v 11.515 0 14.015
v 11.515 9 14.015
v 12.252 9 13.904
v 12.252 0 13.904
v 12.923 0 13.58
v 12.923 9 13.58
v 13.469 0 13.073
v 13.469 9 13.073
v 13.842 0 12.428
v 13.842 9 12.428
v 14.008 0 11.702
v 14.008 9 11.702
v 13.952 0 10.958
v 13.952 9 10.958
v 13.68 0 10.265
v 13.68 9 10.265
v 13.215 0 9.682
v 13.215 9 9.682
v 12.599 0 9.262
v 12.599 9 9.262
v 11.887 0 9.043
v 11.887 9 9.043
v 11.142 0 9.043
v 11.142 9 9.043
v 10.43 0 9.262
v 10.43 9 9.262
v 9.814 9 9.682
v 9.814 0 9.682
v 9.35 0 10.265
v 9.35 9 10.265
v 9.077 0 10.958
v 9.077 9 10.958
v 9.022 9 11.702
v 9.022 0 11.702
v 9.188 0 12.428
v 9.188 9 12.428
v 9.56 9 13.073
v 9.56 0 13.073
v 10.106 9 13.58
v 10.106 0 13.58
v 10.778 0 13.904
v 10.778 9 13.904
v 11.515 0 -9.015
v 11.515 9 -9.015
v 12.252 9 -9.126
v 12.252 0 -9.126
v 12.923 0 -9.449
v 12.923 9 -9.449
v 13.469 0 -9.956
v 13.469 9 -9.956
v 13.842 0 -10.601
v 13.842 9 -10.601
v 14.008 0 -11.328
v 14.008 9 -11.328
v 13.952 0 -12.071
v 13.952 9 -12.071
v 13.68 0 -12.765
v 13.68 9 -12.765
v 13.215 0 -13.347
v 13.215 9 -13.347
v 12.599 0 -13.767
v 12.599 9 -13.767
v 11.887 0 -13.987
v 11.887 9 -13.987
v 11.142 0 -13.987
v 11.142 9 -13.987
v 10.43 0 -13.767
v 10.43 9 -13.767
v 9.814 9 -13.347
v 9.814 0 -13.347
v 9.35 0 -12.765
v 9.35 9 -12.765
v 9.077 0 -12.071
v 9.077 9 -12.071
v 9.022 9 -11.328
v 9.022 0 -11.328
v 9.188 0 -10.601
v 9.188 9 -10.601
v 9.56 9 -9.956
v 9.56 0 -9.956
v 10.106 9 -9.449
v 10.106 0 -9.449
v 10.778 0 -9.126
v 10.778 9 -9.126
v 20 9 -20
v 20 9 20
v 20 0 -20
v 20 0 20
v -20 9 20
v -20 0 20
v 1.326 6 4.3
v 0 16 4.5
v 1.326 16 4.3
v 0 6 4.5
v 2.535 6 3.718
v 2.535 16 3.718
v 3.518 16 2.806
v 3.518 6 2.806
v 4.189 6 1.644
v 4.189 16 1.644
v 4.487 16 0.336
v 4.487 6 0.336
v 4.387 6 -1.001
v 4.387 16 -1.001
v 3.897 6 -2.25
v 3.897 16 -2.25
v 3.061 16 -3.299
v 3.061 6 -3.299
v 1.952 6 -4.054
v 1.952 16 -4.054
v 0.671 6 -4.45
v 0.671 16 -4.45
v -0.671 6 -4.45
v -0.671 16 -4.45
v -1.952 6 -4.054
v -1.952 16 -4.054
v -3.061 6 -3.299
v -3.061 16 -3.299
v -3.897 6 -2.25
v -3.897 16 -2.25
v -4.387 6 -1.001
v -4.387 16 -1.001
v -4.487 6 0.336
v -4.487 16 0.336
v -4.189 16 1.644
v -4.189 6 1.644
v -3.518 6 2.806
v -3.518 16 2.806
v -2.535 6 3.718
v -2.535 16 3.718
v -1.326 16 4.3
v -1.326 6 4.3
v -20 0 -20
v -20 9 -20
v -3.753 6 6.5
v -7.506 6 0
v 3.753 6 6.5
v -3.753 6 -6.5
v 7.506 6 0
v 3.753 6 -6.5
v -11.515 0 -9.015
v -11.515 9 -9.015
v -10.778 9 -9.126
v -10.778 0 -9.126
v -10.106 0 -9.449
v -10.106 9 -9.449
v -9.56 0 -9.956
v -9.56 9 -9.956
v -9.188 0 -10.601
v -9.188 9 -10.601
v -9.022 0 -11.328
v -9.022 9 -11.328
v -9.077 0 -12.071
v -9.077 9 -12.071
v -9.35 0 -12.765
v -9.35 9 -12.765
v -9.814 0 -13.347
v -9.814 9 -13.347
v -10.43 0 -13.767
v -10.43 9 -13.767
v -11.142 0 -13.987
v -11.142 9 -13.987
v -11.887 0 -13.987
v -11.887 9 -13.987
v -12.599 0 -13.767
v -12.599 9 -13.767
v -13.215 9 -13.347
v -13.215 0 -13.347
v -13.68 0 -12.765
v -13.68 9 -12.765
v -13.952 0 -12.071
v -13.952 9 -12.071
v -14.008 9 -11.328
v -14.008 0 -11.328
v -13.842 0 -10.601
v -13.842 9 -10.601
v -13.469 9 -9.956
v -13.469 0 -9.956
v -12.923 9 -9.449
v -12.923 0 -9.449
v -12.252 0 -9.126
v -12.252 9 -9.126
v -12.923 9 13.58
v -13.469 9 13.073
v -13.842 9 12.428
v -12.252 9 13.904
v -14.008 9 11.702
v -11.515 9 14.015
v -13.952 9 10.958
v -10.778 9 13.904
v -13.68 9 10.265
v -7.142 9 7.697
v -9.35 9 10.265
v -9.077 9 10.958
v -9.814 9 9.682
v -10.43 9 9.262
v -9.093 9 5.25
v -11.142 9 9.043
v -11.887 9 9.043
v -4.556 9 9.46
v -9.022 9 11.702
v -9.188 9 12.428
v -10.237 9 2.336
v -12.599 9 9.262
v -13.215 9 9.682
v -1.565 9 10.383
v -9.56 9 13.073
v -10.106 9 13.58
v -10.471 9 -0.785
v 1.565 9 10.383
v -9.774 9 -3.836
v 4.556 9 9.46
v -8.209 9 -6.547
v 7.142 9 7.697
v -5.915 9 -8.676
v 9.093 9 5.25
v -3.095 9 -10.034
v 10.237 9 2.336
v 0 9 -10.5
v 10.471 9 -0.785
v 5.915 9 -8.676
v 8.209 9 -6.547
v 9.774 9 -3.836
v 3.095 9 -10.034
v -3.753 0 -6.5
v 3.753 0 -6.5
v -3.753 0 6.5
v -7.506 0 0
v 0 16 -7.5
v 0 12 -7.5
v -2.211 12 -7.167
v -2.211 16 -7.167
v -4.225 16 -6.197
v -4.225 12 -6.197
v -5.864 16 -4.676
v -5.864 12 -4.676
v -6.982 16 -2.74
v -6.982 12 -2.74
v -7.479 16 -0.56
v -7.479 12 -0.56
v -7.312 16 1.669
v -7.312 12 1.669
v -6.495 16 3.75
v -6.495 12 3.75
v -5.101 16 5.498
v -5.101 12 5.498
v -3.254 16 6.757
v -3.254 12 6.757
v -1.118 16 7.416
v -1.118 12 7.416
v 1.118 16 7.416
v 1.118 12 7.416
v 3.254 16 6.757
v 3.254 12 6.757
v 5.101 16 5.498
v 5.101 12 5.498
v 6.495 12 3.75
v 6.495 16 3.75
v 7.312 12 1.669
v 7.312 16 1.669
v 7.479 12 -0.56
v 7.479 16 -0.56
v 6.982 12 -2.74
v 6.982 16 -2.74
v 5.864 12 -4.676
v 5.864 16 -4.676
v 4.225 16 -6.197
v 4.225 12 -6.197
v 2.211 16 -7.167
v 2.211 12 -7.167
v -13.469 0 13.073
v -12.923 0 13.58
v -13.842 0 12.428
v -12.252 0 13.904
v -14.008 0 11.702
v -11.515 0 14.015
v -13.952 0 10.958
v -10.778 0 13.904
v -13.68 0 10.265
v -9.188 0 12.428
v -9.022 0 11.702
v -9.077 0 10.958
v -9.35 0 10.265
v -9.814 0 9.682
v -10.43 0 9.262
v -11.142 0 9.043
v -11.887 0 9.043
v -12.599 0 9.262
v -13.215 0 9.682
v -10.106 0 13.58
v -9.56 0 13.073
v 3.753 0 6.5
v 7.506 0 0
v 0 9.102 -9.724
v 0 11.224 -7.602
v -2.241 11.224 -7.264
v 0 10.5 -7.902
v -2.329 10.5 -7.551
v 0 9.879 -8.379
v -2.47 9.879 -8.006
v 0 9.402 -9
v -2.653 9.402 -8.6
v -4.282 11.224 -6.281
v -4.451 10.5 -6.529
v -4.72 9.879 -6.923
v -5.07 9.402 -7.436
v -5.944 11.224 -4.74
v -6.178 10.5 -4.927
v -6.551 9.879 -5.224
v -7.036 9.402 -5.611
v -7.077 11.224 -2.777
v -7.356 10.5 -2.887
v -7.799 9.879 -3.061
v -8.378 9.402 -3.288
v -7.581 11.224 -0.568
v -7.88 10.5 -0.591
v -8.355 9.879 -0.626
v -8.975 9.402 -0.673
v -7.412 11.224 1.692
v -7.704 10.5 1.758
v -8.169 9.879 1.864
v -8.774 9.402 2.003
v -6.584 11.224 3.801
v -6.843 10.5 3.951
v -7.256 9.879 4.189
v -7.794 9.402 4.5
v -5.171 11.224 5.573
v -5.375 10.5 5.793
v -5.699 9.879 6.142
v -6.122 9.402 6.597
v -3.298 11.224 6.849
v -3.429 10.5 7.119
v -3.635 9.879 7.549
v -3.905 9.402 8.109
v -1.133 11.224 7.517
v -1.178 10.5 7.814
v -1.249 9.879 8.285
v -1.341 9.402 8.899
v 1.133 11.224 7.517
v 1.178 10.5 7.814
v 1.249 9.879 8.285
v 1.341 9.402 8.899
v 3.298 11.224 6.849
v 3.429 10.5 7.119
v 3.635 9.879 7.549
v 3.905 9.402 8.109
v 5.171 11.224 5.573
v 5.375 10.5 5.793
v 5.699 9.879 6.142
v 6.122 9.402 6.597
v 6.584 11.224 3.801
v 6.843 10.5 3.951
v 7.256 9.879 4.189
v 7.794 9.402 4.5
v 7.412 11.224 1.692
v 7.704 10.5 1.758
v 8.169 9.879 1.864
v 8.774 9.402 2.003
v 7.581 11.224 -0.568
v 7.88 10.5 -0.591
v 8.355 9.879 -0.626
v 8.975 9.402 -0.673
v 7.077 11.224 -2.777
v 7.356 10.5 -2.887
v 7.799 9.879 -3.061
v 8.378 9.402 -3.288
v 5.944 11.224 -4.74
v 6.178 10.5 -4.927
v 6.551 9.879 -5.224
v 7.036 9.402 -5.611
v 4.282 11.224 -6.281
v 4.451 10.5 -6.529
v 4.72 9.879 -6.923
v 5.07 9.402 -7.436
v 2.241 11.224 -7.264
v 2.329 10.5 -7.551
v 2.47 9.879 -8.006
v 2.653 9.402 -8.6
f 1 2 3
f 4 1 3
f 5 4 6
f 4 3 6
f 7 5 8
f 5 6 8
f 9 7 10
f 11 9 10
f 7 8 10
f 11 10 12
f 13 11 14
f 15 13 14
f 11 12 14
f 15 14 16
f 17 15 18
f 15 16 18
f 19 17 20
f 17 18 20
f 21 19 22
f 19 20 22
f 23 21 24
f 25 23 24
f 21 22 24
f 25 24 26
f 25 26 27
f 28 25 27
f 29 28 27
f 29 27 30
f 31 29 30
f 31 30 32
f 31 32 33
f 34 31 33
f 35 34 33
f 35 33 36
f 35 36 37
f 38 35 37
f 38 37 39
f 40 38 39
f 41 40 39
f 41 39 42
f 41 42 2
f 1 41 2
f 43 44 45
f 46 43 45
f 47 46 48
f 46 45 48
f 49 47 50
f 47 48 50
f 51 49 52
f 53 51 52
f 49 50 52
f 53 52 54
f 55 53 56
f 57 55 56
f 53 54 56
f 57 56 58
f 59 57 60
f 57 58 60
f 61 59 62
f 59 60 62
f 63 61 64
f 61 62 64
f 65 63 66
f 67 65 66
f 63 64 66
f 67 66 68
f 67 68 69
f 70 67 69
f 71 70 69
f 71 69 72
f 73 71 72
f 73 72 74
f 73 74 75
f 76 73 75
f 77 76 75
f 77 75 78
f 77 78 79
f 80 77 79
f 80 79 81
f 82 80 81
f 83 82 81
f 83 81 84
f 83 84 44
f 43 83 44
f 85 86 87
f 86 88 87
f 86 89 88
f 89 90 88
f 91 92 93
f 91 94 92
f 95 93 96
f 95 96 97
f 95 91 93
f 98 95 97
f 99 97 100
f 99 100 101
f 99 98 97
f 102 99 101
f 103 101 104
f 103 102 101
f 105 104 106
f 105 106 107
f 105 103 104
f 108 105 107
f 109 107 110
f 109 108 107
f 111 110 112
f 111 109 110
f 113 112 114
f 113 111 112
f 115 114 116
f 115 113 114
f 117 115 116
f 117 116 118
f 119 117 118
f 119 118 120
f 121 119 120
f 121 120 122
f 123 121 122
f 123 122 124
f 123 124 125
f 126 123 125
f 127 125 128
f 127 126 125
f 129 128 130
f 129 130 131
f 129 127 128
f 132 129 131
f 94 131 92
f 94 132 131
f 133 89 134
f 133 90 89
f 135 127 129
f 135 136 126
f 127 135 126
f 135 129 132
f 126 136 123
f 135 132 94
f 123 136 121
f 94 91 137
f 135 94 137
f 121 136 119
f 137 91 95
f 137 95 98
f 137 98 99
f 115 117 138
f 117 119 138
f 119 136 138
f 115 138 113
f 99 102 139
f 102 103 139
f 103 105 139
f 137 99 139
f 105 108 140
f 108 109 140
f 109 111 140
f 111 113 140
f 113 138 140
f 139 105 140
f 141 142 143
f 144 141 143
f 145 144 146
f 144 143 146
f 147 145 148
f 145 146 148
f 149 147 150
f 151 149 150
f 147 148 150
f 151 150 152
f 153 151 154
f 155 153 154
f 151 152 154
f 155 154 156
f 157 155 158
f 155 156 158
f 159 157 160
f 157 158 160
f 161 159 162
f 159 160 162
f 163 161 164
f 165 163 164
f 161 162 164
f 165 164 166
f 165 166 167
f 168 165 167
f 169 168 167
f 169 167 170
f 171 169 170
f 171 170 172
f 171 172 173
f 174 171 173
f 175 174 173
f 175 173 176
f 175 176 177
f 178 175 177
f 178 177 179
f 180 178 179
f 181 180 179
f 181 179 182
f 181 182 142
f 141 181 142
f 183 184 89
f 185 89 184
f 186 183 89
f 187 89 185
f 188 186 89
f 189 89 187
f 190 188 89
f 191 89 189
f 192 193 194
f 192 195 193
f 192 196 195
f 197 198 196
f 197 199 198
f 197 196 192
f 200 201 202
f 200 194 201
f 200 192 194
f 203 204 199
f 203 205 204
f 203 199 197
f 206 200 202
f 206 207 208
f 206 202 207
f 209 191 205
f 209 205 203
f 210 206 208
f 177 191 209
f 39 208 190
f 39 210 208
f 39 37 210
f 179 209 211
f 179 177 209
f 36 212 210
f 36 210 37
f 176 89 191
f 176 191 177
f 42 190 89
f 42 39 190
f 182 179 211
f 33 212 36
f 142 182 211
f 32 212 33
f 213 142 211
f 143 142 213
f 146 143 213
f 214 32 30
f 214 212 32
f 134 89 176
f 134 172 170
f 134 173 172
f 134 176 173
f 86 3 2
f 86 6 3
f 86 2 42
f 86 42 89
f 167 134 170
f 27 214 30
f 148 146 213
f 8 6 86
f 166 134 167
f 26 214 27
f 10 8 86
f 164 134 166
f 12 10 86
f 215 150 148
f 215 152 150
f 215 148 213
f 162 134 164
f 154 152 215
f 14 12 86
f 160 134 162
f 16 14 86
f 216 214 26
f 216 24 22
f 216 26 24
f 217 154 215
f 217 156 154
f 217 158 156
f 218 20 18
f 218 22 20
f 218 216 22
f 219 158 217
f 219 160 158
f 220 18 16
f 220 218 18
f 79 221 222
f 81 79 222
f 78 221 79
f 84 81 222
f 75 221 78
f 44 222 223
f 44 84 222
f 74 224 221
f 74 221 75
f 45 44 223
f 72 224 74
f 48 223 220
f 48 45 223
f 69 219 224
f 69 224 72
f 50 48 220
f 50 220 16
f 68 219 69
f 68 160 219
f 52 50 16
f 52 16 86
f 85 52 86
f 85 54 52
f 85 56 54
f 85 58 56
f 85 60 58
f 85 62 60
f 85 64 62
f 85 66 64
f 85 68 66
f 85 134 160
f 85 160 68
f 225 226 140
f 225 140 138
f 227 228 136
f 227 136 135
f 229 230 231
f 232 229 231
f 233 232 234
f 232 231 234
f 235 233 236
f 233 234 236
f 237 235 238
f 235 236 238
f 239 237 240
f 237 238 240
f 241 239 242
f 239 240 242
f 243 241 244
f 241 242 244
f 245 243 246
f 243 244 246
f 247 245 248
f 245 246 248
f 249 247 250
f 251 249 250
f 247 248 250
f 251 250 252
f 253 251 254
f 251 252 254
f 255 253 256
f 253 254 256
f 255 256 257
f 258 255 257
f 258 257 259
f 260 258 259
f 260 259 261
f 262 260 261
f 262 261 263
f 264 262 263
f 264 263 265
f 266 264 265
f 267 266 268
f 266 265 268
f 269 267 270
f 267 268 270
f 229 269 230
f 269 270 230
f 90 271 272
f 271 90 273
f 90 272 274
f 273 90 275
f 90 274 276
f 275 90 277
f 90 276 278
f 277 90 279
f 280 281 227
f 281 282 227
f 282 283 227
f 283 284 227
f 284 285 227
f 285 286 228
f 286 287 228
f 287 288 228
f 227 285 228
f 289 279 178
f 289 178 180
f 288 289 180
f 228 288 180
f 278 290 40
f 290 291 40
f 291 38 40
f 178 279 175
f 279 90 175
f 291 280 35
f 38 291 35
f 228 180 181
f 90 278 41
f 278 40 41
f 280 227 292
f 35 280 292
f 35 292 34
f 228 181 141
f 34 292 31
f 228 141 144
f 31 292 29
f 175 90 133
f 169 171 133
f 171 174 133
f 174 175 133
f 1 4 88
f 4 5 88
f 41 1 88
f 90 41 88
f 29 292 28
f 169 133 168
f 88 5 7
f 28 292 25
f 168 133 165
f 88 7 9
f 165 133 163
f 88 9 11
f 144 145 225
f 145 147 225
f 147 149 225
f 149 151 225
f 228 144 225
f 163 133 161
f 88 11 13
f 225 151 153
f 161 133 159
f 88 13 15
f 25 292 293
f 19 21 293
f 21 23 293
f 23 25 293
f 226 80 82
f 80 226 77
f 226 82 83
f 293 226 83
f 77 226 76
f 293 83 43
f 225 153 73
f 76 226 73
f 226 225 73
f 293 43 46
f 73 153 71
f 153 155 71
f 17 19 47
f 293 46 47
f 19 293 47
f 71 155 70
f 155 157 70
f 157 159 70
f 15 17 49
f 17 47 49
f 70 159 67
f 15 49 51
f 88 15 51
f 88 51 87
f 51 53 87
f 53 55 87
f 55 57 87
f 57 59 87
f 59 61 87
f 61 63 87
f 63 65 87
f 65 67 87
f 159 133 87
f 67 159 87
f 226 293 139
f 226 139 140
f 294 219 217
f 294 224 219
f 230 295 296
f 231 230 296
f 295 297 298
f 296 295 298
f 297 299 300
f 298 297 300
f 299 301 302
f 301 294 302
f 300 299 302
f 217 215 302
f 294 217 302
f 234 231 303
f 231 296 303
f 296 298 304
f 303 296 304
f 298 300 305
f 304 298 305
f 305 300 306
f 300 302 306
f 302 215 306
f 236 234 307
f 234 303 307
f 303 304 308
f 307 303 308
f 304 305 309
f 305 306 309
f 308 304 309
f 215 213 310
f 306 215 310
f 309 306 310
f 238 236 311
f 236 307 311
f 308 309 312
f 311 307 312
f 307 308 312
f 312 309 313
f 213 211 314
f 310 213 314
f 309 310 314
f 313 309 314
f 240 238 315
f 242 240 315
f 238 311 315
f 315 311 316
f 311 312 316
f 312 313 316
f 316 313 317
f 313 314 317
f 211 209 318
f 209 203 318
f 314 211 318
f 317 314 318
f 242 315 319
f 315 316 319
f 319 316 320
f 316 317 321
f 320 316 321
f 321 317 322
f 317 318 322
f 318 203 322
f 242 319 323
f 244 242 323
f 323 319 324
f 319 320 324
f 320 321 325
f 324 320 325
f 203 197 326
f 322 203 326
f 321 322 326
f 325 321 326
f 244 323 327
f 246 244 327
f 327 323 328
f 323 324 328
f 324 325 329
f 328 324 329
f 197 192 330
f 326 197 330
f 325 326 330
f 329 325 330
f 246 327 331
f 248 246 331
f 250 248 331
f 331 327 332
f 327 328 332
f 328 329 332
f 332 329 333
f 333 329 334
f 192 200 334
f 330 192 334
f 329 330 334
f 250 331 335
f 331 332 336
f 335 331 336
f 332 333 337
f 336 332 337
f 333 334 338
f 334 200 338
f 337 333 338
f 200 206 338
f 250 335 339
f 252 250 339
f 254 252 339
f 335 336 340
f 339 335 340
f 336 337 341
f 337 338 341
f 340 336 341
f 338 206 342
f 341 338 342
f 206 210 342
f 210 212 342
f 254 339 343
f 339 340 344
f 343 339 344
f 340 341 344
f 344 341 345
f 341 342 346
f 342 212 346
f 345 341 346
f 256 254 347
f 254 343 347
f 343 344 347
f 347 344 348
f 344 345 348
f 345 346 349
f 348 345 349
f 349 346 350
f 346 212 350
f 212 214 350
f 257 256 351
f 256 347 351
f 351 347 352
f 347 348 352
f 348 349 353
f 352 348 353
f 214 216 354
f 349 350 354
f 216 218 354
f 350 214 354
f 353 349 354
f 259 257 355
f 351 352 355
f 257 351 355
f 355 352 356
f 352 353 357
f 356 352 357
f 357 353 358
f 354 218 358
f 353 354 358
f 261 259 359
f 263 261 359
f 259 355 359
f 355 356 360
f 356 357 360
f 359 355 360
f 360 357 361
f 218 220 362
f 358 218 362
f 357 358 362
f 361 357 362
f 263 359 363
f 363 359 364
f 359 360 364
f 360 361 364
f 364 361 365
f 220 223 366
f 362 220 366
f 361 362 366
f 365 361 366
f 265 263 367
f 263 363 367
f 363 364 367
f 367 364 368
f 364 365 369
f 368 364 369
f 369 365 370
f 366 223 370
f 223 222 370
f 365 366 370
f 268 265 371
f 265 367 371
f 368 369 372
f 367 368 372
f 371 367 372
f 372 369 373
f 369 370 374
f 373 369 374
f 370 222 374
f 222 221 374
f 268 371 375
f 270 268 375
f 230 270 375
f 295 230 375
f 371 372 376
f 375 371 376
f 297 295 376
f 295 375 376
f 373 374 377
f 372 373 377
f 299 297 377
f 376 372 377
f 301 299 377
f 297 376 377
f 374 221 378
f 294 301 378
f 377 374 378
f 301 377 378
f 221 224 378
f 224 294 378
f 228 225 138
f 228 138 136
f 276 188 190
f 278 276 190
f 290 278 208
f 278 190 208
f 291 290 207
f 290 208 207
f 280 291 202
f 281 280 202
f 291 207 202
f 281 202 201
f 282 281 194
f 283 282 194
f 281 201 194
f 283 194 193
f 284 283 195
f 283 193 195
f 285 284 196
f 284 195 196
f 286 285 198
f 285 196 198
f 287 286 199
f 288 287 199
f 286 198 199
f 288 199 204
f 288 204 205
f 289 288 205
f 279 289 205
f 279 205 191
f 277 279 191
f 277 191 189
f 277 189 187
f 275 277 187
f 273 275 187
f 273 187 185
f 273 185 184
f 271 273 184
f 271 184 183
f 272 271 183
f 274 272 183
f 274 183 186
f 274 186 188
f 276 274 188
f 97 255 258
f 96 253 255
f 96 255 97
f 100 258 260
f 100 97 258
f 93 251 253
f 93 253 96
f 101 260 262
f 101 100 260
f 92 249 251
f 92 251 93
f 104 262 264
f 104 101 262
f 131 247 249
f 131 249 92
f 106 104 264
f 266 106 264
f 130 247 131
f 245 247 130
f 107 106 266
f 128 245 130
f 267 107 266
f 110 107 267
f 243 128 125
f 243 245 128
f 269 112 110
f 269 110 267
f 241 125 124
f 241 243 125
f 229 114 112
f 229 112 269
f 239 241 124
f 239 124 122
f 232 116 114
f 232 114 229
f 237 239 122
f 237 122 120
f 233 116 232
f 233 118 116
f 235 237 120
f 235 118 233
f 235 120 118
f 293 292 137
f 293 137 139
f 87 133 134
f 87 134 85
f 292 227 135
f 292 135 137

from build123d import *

# Parameters (mm, degrees)
SKETCH1_W           = 40
SKETCH1_H           = 40
BOSS_EXTRUDE1_DEPTH = 6
SKETCH2_W           = 40
SKETCH2_H           = 40
SKETCH2_R           = 4.5
BOSS_EXTRUDE2_DEPTH = 3
SKETCH3_R           = 2.5
CUT_EXTRUDE1_DEPTH  = 24
SKETCH4_R           = 7.5
SKETCH4_R_2         = 4.5
BOSS_EXTRUDE3_DEPTH = 7
FILLET1_R           = 3


with BuildPart() as part:
    # Sketch1 → Boss-Extrude1 (new body)
    with BuildSketch(Plane(origin=(0, 0, 0), x_dir=(1, 0, 0), z_dir=(0, 1, 0))):
        Rectangle(SKETCH1_W, SKETCH1_H)
        Polygon((7.505553499, 0), (3.75277675, 6.5), (-3.75277675, 6.5), (-7.505553499, 0), (-3.75277675, -6.5), (3.75277675, -6.5), align=None, mode=Mode.SUBTRACT)
    extrude(amount=BOSS_EXTRUDE1_DEPTH)

    # Sketch2 → Boss-Extrude2 (add)
    with BuildSketch(Plane(origin=(0, 6, 0), x_dir=(1, 0, 0), z_dir=(0, 1, 0))):
        Rectangle(SKETCH2_W, SKETCH2_H)
        with Locations(Location((0, 0, 0), (0, 0, 270))):
            Circle(SKETCH2_R, mode=Mode.SUBTRACT)
    extrude(amount=BOSS_EXTRUDE2_DEPTH)

    # Sketch3 → Cut-Extrude1 (cut)
    with BuildSketch(Plane(origin=(0, 9, 0), x_dir=(1, 0, 0), z_dir=(0, 1, 0))):
        with Locations(Location((-11.514718626, 11.514718626, 0), (0, 0, 270))):
            Circle(SKETCH3_R)
        with Locations(Location((11.514718626, 11.514718626, 0), (0, 0, 270))):
            Circle(SKETCH3_R)
        with Locations(Location((11.514718626, -11.514718626, 0), (0, 0, 270))):
            Circle(SKETCH3_R)
        with Locations(Location((-11.514718626, -11.514718626, 0), (0, 0, 270))):
            Circle(SKETCH3_R)
    extrude(amount=-CUT_EXTRUDE1_DEPTH, mode=Mode.SUBTRACT)

    # Sketch4 → Boss-Extrude3 (add)
    with BuildSketch(Plane(origin=(0, 9, 0), x_dir=(1, 0, 0), z_dir=(0, 1, 0))):
        with Locations(Location((0, 0, 0), (0, 0, 90))):
            Circle(SKETCH4_R)
        with Locations(Location((0, 0, 0), (0, 0, 270))):
            Circle(SKETCH4_R_2, mode=Mode.SUBTRACT)
    extrude(amount=BOSS_EXTRUDE3_DEPTH)

    # Fillet1
    fillet1_edges = [part.edges().sort_by_distance(p)[0] for p in [
        (0, 9, 7.5),
    ]]
    fillet(fillet1_edges, radius=FILLET1_R)


solid = part.part
